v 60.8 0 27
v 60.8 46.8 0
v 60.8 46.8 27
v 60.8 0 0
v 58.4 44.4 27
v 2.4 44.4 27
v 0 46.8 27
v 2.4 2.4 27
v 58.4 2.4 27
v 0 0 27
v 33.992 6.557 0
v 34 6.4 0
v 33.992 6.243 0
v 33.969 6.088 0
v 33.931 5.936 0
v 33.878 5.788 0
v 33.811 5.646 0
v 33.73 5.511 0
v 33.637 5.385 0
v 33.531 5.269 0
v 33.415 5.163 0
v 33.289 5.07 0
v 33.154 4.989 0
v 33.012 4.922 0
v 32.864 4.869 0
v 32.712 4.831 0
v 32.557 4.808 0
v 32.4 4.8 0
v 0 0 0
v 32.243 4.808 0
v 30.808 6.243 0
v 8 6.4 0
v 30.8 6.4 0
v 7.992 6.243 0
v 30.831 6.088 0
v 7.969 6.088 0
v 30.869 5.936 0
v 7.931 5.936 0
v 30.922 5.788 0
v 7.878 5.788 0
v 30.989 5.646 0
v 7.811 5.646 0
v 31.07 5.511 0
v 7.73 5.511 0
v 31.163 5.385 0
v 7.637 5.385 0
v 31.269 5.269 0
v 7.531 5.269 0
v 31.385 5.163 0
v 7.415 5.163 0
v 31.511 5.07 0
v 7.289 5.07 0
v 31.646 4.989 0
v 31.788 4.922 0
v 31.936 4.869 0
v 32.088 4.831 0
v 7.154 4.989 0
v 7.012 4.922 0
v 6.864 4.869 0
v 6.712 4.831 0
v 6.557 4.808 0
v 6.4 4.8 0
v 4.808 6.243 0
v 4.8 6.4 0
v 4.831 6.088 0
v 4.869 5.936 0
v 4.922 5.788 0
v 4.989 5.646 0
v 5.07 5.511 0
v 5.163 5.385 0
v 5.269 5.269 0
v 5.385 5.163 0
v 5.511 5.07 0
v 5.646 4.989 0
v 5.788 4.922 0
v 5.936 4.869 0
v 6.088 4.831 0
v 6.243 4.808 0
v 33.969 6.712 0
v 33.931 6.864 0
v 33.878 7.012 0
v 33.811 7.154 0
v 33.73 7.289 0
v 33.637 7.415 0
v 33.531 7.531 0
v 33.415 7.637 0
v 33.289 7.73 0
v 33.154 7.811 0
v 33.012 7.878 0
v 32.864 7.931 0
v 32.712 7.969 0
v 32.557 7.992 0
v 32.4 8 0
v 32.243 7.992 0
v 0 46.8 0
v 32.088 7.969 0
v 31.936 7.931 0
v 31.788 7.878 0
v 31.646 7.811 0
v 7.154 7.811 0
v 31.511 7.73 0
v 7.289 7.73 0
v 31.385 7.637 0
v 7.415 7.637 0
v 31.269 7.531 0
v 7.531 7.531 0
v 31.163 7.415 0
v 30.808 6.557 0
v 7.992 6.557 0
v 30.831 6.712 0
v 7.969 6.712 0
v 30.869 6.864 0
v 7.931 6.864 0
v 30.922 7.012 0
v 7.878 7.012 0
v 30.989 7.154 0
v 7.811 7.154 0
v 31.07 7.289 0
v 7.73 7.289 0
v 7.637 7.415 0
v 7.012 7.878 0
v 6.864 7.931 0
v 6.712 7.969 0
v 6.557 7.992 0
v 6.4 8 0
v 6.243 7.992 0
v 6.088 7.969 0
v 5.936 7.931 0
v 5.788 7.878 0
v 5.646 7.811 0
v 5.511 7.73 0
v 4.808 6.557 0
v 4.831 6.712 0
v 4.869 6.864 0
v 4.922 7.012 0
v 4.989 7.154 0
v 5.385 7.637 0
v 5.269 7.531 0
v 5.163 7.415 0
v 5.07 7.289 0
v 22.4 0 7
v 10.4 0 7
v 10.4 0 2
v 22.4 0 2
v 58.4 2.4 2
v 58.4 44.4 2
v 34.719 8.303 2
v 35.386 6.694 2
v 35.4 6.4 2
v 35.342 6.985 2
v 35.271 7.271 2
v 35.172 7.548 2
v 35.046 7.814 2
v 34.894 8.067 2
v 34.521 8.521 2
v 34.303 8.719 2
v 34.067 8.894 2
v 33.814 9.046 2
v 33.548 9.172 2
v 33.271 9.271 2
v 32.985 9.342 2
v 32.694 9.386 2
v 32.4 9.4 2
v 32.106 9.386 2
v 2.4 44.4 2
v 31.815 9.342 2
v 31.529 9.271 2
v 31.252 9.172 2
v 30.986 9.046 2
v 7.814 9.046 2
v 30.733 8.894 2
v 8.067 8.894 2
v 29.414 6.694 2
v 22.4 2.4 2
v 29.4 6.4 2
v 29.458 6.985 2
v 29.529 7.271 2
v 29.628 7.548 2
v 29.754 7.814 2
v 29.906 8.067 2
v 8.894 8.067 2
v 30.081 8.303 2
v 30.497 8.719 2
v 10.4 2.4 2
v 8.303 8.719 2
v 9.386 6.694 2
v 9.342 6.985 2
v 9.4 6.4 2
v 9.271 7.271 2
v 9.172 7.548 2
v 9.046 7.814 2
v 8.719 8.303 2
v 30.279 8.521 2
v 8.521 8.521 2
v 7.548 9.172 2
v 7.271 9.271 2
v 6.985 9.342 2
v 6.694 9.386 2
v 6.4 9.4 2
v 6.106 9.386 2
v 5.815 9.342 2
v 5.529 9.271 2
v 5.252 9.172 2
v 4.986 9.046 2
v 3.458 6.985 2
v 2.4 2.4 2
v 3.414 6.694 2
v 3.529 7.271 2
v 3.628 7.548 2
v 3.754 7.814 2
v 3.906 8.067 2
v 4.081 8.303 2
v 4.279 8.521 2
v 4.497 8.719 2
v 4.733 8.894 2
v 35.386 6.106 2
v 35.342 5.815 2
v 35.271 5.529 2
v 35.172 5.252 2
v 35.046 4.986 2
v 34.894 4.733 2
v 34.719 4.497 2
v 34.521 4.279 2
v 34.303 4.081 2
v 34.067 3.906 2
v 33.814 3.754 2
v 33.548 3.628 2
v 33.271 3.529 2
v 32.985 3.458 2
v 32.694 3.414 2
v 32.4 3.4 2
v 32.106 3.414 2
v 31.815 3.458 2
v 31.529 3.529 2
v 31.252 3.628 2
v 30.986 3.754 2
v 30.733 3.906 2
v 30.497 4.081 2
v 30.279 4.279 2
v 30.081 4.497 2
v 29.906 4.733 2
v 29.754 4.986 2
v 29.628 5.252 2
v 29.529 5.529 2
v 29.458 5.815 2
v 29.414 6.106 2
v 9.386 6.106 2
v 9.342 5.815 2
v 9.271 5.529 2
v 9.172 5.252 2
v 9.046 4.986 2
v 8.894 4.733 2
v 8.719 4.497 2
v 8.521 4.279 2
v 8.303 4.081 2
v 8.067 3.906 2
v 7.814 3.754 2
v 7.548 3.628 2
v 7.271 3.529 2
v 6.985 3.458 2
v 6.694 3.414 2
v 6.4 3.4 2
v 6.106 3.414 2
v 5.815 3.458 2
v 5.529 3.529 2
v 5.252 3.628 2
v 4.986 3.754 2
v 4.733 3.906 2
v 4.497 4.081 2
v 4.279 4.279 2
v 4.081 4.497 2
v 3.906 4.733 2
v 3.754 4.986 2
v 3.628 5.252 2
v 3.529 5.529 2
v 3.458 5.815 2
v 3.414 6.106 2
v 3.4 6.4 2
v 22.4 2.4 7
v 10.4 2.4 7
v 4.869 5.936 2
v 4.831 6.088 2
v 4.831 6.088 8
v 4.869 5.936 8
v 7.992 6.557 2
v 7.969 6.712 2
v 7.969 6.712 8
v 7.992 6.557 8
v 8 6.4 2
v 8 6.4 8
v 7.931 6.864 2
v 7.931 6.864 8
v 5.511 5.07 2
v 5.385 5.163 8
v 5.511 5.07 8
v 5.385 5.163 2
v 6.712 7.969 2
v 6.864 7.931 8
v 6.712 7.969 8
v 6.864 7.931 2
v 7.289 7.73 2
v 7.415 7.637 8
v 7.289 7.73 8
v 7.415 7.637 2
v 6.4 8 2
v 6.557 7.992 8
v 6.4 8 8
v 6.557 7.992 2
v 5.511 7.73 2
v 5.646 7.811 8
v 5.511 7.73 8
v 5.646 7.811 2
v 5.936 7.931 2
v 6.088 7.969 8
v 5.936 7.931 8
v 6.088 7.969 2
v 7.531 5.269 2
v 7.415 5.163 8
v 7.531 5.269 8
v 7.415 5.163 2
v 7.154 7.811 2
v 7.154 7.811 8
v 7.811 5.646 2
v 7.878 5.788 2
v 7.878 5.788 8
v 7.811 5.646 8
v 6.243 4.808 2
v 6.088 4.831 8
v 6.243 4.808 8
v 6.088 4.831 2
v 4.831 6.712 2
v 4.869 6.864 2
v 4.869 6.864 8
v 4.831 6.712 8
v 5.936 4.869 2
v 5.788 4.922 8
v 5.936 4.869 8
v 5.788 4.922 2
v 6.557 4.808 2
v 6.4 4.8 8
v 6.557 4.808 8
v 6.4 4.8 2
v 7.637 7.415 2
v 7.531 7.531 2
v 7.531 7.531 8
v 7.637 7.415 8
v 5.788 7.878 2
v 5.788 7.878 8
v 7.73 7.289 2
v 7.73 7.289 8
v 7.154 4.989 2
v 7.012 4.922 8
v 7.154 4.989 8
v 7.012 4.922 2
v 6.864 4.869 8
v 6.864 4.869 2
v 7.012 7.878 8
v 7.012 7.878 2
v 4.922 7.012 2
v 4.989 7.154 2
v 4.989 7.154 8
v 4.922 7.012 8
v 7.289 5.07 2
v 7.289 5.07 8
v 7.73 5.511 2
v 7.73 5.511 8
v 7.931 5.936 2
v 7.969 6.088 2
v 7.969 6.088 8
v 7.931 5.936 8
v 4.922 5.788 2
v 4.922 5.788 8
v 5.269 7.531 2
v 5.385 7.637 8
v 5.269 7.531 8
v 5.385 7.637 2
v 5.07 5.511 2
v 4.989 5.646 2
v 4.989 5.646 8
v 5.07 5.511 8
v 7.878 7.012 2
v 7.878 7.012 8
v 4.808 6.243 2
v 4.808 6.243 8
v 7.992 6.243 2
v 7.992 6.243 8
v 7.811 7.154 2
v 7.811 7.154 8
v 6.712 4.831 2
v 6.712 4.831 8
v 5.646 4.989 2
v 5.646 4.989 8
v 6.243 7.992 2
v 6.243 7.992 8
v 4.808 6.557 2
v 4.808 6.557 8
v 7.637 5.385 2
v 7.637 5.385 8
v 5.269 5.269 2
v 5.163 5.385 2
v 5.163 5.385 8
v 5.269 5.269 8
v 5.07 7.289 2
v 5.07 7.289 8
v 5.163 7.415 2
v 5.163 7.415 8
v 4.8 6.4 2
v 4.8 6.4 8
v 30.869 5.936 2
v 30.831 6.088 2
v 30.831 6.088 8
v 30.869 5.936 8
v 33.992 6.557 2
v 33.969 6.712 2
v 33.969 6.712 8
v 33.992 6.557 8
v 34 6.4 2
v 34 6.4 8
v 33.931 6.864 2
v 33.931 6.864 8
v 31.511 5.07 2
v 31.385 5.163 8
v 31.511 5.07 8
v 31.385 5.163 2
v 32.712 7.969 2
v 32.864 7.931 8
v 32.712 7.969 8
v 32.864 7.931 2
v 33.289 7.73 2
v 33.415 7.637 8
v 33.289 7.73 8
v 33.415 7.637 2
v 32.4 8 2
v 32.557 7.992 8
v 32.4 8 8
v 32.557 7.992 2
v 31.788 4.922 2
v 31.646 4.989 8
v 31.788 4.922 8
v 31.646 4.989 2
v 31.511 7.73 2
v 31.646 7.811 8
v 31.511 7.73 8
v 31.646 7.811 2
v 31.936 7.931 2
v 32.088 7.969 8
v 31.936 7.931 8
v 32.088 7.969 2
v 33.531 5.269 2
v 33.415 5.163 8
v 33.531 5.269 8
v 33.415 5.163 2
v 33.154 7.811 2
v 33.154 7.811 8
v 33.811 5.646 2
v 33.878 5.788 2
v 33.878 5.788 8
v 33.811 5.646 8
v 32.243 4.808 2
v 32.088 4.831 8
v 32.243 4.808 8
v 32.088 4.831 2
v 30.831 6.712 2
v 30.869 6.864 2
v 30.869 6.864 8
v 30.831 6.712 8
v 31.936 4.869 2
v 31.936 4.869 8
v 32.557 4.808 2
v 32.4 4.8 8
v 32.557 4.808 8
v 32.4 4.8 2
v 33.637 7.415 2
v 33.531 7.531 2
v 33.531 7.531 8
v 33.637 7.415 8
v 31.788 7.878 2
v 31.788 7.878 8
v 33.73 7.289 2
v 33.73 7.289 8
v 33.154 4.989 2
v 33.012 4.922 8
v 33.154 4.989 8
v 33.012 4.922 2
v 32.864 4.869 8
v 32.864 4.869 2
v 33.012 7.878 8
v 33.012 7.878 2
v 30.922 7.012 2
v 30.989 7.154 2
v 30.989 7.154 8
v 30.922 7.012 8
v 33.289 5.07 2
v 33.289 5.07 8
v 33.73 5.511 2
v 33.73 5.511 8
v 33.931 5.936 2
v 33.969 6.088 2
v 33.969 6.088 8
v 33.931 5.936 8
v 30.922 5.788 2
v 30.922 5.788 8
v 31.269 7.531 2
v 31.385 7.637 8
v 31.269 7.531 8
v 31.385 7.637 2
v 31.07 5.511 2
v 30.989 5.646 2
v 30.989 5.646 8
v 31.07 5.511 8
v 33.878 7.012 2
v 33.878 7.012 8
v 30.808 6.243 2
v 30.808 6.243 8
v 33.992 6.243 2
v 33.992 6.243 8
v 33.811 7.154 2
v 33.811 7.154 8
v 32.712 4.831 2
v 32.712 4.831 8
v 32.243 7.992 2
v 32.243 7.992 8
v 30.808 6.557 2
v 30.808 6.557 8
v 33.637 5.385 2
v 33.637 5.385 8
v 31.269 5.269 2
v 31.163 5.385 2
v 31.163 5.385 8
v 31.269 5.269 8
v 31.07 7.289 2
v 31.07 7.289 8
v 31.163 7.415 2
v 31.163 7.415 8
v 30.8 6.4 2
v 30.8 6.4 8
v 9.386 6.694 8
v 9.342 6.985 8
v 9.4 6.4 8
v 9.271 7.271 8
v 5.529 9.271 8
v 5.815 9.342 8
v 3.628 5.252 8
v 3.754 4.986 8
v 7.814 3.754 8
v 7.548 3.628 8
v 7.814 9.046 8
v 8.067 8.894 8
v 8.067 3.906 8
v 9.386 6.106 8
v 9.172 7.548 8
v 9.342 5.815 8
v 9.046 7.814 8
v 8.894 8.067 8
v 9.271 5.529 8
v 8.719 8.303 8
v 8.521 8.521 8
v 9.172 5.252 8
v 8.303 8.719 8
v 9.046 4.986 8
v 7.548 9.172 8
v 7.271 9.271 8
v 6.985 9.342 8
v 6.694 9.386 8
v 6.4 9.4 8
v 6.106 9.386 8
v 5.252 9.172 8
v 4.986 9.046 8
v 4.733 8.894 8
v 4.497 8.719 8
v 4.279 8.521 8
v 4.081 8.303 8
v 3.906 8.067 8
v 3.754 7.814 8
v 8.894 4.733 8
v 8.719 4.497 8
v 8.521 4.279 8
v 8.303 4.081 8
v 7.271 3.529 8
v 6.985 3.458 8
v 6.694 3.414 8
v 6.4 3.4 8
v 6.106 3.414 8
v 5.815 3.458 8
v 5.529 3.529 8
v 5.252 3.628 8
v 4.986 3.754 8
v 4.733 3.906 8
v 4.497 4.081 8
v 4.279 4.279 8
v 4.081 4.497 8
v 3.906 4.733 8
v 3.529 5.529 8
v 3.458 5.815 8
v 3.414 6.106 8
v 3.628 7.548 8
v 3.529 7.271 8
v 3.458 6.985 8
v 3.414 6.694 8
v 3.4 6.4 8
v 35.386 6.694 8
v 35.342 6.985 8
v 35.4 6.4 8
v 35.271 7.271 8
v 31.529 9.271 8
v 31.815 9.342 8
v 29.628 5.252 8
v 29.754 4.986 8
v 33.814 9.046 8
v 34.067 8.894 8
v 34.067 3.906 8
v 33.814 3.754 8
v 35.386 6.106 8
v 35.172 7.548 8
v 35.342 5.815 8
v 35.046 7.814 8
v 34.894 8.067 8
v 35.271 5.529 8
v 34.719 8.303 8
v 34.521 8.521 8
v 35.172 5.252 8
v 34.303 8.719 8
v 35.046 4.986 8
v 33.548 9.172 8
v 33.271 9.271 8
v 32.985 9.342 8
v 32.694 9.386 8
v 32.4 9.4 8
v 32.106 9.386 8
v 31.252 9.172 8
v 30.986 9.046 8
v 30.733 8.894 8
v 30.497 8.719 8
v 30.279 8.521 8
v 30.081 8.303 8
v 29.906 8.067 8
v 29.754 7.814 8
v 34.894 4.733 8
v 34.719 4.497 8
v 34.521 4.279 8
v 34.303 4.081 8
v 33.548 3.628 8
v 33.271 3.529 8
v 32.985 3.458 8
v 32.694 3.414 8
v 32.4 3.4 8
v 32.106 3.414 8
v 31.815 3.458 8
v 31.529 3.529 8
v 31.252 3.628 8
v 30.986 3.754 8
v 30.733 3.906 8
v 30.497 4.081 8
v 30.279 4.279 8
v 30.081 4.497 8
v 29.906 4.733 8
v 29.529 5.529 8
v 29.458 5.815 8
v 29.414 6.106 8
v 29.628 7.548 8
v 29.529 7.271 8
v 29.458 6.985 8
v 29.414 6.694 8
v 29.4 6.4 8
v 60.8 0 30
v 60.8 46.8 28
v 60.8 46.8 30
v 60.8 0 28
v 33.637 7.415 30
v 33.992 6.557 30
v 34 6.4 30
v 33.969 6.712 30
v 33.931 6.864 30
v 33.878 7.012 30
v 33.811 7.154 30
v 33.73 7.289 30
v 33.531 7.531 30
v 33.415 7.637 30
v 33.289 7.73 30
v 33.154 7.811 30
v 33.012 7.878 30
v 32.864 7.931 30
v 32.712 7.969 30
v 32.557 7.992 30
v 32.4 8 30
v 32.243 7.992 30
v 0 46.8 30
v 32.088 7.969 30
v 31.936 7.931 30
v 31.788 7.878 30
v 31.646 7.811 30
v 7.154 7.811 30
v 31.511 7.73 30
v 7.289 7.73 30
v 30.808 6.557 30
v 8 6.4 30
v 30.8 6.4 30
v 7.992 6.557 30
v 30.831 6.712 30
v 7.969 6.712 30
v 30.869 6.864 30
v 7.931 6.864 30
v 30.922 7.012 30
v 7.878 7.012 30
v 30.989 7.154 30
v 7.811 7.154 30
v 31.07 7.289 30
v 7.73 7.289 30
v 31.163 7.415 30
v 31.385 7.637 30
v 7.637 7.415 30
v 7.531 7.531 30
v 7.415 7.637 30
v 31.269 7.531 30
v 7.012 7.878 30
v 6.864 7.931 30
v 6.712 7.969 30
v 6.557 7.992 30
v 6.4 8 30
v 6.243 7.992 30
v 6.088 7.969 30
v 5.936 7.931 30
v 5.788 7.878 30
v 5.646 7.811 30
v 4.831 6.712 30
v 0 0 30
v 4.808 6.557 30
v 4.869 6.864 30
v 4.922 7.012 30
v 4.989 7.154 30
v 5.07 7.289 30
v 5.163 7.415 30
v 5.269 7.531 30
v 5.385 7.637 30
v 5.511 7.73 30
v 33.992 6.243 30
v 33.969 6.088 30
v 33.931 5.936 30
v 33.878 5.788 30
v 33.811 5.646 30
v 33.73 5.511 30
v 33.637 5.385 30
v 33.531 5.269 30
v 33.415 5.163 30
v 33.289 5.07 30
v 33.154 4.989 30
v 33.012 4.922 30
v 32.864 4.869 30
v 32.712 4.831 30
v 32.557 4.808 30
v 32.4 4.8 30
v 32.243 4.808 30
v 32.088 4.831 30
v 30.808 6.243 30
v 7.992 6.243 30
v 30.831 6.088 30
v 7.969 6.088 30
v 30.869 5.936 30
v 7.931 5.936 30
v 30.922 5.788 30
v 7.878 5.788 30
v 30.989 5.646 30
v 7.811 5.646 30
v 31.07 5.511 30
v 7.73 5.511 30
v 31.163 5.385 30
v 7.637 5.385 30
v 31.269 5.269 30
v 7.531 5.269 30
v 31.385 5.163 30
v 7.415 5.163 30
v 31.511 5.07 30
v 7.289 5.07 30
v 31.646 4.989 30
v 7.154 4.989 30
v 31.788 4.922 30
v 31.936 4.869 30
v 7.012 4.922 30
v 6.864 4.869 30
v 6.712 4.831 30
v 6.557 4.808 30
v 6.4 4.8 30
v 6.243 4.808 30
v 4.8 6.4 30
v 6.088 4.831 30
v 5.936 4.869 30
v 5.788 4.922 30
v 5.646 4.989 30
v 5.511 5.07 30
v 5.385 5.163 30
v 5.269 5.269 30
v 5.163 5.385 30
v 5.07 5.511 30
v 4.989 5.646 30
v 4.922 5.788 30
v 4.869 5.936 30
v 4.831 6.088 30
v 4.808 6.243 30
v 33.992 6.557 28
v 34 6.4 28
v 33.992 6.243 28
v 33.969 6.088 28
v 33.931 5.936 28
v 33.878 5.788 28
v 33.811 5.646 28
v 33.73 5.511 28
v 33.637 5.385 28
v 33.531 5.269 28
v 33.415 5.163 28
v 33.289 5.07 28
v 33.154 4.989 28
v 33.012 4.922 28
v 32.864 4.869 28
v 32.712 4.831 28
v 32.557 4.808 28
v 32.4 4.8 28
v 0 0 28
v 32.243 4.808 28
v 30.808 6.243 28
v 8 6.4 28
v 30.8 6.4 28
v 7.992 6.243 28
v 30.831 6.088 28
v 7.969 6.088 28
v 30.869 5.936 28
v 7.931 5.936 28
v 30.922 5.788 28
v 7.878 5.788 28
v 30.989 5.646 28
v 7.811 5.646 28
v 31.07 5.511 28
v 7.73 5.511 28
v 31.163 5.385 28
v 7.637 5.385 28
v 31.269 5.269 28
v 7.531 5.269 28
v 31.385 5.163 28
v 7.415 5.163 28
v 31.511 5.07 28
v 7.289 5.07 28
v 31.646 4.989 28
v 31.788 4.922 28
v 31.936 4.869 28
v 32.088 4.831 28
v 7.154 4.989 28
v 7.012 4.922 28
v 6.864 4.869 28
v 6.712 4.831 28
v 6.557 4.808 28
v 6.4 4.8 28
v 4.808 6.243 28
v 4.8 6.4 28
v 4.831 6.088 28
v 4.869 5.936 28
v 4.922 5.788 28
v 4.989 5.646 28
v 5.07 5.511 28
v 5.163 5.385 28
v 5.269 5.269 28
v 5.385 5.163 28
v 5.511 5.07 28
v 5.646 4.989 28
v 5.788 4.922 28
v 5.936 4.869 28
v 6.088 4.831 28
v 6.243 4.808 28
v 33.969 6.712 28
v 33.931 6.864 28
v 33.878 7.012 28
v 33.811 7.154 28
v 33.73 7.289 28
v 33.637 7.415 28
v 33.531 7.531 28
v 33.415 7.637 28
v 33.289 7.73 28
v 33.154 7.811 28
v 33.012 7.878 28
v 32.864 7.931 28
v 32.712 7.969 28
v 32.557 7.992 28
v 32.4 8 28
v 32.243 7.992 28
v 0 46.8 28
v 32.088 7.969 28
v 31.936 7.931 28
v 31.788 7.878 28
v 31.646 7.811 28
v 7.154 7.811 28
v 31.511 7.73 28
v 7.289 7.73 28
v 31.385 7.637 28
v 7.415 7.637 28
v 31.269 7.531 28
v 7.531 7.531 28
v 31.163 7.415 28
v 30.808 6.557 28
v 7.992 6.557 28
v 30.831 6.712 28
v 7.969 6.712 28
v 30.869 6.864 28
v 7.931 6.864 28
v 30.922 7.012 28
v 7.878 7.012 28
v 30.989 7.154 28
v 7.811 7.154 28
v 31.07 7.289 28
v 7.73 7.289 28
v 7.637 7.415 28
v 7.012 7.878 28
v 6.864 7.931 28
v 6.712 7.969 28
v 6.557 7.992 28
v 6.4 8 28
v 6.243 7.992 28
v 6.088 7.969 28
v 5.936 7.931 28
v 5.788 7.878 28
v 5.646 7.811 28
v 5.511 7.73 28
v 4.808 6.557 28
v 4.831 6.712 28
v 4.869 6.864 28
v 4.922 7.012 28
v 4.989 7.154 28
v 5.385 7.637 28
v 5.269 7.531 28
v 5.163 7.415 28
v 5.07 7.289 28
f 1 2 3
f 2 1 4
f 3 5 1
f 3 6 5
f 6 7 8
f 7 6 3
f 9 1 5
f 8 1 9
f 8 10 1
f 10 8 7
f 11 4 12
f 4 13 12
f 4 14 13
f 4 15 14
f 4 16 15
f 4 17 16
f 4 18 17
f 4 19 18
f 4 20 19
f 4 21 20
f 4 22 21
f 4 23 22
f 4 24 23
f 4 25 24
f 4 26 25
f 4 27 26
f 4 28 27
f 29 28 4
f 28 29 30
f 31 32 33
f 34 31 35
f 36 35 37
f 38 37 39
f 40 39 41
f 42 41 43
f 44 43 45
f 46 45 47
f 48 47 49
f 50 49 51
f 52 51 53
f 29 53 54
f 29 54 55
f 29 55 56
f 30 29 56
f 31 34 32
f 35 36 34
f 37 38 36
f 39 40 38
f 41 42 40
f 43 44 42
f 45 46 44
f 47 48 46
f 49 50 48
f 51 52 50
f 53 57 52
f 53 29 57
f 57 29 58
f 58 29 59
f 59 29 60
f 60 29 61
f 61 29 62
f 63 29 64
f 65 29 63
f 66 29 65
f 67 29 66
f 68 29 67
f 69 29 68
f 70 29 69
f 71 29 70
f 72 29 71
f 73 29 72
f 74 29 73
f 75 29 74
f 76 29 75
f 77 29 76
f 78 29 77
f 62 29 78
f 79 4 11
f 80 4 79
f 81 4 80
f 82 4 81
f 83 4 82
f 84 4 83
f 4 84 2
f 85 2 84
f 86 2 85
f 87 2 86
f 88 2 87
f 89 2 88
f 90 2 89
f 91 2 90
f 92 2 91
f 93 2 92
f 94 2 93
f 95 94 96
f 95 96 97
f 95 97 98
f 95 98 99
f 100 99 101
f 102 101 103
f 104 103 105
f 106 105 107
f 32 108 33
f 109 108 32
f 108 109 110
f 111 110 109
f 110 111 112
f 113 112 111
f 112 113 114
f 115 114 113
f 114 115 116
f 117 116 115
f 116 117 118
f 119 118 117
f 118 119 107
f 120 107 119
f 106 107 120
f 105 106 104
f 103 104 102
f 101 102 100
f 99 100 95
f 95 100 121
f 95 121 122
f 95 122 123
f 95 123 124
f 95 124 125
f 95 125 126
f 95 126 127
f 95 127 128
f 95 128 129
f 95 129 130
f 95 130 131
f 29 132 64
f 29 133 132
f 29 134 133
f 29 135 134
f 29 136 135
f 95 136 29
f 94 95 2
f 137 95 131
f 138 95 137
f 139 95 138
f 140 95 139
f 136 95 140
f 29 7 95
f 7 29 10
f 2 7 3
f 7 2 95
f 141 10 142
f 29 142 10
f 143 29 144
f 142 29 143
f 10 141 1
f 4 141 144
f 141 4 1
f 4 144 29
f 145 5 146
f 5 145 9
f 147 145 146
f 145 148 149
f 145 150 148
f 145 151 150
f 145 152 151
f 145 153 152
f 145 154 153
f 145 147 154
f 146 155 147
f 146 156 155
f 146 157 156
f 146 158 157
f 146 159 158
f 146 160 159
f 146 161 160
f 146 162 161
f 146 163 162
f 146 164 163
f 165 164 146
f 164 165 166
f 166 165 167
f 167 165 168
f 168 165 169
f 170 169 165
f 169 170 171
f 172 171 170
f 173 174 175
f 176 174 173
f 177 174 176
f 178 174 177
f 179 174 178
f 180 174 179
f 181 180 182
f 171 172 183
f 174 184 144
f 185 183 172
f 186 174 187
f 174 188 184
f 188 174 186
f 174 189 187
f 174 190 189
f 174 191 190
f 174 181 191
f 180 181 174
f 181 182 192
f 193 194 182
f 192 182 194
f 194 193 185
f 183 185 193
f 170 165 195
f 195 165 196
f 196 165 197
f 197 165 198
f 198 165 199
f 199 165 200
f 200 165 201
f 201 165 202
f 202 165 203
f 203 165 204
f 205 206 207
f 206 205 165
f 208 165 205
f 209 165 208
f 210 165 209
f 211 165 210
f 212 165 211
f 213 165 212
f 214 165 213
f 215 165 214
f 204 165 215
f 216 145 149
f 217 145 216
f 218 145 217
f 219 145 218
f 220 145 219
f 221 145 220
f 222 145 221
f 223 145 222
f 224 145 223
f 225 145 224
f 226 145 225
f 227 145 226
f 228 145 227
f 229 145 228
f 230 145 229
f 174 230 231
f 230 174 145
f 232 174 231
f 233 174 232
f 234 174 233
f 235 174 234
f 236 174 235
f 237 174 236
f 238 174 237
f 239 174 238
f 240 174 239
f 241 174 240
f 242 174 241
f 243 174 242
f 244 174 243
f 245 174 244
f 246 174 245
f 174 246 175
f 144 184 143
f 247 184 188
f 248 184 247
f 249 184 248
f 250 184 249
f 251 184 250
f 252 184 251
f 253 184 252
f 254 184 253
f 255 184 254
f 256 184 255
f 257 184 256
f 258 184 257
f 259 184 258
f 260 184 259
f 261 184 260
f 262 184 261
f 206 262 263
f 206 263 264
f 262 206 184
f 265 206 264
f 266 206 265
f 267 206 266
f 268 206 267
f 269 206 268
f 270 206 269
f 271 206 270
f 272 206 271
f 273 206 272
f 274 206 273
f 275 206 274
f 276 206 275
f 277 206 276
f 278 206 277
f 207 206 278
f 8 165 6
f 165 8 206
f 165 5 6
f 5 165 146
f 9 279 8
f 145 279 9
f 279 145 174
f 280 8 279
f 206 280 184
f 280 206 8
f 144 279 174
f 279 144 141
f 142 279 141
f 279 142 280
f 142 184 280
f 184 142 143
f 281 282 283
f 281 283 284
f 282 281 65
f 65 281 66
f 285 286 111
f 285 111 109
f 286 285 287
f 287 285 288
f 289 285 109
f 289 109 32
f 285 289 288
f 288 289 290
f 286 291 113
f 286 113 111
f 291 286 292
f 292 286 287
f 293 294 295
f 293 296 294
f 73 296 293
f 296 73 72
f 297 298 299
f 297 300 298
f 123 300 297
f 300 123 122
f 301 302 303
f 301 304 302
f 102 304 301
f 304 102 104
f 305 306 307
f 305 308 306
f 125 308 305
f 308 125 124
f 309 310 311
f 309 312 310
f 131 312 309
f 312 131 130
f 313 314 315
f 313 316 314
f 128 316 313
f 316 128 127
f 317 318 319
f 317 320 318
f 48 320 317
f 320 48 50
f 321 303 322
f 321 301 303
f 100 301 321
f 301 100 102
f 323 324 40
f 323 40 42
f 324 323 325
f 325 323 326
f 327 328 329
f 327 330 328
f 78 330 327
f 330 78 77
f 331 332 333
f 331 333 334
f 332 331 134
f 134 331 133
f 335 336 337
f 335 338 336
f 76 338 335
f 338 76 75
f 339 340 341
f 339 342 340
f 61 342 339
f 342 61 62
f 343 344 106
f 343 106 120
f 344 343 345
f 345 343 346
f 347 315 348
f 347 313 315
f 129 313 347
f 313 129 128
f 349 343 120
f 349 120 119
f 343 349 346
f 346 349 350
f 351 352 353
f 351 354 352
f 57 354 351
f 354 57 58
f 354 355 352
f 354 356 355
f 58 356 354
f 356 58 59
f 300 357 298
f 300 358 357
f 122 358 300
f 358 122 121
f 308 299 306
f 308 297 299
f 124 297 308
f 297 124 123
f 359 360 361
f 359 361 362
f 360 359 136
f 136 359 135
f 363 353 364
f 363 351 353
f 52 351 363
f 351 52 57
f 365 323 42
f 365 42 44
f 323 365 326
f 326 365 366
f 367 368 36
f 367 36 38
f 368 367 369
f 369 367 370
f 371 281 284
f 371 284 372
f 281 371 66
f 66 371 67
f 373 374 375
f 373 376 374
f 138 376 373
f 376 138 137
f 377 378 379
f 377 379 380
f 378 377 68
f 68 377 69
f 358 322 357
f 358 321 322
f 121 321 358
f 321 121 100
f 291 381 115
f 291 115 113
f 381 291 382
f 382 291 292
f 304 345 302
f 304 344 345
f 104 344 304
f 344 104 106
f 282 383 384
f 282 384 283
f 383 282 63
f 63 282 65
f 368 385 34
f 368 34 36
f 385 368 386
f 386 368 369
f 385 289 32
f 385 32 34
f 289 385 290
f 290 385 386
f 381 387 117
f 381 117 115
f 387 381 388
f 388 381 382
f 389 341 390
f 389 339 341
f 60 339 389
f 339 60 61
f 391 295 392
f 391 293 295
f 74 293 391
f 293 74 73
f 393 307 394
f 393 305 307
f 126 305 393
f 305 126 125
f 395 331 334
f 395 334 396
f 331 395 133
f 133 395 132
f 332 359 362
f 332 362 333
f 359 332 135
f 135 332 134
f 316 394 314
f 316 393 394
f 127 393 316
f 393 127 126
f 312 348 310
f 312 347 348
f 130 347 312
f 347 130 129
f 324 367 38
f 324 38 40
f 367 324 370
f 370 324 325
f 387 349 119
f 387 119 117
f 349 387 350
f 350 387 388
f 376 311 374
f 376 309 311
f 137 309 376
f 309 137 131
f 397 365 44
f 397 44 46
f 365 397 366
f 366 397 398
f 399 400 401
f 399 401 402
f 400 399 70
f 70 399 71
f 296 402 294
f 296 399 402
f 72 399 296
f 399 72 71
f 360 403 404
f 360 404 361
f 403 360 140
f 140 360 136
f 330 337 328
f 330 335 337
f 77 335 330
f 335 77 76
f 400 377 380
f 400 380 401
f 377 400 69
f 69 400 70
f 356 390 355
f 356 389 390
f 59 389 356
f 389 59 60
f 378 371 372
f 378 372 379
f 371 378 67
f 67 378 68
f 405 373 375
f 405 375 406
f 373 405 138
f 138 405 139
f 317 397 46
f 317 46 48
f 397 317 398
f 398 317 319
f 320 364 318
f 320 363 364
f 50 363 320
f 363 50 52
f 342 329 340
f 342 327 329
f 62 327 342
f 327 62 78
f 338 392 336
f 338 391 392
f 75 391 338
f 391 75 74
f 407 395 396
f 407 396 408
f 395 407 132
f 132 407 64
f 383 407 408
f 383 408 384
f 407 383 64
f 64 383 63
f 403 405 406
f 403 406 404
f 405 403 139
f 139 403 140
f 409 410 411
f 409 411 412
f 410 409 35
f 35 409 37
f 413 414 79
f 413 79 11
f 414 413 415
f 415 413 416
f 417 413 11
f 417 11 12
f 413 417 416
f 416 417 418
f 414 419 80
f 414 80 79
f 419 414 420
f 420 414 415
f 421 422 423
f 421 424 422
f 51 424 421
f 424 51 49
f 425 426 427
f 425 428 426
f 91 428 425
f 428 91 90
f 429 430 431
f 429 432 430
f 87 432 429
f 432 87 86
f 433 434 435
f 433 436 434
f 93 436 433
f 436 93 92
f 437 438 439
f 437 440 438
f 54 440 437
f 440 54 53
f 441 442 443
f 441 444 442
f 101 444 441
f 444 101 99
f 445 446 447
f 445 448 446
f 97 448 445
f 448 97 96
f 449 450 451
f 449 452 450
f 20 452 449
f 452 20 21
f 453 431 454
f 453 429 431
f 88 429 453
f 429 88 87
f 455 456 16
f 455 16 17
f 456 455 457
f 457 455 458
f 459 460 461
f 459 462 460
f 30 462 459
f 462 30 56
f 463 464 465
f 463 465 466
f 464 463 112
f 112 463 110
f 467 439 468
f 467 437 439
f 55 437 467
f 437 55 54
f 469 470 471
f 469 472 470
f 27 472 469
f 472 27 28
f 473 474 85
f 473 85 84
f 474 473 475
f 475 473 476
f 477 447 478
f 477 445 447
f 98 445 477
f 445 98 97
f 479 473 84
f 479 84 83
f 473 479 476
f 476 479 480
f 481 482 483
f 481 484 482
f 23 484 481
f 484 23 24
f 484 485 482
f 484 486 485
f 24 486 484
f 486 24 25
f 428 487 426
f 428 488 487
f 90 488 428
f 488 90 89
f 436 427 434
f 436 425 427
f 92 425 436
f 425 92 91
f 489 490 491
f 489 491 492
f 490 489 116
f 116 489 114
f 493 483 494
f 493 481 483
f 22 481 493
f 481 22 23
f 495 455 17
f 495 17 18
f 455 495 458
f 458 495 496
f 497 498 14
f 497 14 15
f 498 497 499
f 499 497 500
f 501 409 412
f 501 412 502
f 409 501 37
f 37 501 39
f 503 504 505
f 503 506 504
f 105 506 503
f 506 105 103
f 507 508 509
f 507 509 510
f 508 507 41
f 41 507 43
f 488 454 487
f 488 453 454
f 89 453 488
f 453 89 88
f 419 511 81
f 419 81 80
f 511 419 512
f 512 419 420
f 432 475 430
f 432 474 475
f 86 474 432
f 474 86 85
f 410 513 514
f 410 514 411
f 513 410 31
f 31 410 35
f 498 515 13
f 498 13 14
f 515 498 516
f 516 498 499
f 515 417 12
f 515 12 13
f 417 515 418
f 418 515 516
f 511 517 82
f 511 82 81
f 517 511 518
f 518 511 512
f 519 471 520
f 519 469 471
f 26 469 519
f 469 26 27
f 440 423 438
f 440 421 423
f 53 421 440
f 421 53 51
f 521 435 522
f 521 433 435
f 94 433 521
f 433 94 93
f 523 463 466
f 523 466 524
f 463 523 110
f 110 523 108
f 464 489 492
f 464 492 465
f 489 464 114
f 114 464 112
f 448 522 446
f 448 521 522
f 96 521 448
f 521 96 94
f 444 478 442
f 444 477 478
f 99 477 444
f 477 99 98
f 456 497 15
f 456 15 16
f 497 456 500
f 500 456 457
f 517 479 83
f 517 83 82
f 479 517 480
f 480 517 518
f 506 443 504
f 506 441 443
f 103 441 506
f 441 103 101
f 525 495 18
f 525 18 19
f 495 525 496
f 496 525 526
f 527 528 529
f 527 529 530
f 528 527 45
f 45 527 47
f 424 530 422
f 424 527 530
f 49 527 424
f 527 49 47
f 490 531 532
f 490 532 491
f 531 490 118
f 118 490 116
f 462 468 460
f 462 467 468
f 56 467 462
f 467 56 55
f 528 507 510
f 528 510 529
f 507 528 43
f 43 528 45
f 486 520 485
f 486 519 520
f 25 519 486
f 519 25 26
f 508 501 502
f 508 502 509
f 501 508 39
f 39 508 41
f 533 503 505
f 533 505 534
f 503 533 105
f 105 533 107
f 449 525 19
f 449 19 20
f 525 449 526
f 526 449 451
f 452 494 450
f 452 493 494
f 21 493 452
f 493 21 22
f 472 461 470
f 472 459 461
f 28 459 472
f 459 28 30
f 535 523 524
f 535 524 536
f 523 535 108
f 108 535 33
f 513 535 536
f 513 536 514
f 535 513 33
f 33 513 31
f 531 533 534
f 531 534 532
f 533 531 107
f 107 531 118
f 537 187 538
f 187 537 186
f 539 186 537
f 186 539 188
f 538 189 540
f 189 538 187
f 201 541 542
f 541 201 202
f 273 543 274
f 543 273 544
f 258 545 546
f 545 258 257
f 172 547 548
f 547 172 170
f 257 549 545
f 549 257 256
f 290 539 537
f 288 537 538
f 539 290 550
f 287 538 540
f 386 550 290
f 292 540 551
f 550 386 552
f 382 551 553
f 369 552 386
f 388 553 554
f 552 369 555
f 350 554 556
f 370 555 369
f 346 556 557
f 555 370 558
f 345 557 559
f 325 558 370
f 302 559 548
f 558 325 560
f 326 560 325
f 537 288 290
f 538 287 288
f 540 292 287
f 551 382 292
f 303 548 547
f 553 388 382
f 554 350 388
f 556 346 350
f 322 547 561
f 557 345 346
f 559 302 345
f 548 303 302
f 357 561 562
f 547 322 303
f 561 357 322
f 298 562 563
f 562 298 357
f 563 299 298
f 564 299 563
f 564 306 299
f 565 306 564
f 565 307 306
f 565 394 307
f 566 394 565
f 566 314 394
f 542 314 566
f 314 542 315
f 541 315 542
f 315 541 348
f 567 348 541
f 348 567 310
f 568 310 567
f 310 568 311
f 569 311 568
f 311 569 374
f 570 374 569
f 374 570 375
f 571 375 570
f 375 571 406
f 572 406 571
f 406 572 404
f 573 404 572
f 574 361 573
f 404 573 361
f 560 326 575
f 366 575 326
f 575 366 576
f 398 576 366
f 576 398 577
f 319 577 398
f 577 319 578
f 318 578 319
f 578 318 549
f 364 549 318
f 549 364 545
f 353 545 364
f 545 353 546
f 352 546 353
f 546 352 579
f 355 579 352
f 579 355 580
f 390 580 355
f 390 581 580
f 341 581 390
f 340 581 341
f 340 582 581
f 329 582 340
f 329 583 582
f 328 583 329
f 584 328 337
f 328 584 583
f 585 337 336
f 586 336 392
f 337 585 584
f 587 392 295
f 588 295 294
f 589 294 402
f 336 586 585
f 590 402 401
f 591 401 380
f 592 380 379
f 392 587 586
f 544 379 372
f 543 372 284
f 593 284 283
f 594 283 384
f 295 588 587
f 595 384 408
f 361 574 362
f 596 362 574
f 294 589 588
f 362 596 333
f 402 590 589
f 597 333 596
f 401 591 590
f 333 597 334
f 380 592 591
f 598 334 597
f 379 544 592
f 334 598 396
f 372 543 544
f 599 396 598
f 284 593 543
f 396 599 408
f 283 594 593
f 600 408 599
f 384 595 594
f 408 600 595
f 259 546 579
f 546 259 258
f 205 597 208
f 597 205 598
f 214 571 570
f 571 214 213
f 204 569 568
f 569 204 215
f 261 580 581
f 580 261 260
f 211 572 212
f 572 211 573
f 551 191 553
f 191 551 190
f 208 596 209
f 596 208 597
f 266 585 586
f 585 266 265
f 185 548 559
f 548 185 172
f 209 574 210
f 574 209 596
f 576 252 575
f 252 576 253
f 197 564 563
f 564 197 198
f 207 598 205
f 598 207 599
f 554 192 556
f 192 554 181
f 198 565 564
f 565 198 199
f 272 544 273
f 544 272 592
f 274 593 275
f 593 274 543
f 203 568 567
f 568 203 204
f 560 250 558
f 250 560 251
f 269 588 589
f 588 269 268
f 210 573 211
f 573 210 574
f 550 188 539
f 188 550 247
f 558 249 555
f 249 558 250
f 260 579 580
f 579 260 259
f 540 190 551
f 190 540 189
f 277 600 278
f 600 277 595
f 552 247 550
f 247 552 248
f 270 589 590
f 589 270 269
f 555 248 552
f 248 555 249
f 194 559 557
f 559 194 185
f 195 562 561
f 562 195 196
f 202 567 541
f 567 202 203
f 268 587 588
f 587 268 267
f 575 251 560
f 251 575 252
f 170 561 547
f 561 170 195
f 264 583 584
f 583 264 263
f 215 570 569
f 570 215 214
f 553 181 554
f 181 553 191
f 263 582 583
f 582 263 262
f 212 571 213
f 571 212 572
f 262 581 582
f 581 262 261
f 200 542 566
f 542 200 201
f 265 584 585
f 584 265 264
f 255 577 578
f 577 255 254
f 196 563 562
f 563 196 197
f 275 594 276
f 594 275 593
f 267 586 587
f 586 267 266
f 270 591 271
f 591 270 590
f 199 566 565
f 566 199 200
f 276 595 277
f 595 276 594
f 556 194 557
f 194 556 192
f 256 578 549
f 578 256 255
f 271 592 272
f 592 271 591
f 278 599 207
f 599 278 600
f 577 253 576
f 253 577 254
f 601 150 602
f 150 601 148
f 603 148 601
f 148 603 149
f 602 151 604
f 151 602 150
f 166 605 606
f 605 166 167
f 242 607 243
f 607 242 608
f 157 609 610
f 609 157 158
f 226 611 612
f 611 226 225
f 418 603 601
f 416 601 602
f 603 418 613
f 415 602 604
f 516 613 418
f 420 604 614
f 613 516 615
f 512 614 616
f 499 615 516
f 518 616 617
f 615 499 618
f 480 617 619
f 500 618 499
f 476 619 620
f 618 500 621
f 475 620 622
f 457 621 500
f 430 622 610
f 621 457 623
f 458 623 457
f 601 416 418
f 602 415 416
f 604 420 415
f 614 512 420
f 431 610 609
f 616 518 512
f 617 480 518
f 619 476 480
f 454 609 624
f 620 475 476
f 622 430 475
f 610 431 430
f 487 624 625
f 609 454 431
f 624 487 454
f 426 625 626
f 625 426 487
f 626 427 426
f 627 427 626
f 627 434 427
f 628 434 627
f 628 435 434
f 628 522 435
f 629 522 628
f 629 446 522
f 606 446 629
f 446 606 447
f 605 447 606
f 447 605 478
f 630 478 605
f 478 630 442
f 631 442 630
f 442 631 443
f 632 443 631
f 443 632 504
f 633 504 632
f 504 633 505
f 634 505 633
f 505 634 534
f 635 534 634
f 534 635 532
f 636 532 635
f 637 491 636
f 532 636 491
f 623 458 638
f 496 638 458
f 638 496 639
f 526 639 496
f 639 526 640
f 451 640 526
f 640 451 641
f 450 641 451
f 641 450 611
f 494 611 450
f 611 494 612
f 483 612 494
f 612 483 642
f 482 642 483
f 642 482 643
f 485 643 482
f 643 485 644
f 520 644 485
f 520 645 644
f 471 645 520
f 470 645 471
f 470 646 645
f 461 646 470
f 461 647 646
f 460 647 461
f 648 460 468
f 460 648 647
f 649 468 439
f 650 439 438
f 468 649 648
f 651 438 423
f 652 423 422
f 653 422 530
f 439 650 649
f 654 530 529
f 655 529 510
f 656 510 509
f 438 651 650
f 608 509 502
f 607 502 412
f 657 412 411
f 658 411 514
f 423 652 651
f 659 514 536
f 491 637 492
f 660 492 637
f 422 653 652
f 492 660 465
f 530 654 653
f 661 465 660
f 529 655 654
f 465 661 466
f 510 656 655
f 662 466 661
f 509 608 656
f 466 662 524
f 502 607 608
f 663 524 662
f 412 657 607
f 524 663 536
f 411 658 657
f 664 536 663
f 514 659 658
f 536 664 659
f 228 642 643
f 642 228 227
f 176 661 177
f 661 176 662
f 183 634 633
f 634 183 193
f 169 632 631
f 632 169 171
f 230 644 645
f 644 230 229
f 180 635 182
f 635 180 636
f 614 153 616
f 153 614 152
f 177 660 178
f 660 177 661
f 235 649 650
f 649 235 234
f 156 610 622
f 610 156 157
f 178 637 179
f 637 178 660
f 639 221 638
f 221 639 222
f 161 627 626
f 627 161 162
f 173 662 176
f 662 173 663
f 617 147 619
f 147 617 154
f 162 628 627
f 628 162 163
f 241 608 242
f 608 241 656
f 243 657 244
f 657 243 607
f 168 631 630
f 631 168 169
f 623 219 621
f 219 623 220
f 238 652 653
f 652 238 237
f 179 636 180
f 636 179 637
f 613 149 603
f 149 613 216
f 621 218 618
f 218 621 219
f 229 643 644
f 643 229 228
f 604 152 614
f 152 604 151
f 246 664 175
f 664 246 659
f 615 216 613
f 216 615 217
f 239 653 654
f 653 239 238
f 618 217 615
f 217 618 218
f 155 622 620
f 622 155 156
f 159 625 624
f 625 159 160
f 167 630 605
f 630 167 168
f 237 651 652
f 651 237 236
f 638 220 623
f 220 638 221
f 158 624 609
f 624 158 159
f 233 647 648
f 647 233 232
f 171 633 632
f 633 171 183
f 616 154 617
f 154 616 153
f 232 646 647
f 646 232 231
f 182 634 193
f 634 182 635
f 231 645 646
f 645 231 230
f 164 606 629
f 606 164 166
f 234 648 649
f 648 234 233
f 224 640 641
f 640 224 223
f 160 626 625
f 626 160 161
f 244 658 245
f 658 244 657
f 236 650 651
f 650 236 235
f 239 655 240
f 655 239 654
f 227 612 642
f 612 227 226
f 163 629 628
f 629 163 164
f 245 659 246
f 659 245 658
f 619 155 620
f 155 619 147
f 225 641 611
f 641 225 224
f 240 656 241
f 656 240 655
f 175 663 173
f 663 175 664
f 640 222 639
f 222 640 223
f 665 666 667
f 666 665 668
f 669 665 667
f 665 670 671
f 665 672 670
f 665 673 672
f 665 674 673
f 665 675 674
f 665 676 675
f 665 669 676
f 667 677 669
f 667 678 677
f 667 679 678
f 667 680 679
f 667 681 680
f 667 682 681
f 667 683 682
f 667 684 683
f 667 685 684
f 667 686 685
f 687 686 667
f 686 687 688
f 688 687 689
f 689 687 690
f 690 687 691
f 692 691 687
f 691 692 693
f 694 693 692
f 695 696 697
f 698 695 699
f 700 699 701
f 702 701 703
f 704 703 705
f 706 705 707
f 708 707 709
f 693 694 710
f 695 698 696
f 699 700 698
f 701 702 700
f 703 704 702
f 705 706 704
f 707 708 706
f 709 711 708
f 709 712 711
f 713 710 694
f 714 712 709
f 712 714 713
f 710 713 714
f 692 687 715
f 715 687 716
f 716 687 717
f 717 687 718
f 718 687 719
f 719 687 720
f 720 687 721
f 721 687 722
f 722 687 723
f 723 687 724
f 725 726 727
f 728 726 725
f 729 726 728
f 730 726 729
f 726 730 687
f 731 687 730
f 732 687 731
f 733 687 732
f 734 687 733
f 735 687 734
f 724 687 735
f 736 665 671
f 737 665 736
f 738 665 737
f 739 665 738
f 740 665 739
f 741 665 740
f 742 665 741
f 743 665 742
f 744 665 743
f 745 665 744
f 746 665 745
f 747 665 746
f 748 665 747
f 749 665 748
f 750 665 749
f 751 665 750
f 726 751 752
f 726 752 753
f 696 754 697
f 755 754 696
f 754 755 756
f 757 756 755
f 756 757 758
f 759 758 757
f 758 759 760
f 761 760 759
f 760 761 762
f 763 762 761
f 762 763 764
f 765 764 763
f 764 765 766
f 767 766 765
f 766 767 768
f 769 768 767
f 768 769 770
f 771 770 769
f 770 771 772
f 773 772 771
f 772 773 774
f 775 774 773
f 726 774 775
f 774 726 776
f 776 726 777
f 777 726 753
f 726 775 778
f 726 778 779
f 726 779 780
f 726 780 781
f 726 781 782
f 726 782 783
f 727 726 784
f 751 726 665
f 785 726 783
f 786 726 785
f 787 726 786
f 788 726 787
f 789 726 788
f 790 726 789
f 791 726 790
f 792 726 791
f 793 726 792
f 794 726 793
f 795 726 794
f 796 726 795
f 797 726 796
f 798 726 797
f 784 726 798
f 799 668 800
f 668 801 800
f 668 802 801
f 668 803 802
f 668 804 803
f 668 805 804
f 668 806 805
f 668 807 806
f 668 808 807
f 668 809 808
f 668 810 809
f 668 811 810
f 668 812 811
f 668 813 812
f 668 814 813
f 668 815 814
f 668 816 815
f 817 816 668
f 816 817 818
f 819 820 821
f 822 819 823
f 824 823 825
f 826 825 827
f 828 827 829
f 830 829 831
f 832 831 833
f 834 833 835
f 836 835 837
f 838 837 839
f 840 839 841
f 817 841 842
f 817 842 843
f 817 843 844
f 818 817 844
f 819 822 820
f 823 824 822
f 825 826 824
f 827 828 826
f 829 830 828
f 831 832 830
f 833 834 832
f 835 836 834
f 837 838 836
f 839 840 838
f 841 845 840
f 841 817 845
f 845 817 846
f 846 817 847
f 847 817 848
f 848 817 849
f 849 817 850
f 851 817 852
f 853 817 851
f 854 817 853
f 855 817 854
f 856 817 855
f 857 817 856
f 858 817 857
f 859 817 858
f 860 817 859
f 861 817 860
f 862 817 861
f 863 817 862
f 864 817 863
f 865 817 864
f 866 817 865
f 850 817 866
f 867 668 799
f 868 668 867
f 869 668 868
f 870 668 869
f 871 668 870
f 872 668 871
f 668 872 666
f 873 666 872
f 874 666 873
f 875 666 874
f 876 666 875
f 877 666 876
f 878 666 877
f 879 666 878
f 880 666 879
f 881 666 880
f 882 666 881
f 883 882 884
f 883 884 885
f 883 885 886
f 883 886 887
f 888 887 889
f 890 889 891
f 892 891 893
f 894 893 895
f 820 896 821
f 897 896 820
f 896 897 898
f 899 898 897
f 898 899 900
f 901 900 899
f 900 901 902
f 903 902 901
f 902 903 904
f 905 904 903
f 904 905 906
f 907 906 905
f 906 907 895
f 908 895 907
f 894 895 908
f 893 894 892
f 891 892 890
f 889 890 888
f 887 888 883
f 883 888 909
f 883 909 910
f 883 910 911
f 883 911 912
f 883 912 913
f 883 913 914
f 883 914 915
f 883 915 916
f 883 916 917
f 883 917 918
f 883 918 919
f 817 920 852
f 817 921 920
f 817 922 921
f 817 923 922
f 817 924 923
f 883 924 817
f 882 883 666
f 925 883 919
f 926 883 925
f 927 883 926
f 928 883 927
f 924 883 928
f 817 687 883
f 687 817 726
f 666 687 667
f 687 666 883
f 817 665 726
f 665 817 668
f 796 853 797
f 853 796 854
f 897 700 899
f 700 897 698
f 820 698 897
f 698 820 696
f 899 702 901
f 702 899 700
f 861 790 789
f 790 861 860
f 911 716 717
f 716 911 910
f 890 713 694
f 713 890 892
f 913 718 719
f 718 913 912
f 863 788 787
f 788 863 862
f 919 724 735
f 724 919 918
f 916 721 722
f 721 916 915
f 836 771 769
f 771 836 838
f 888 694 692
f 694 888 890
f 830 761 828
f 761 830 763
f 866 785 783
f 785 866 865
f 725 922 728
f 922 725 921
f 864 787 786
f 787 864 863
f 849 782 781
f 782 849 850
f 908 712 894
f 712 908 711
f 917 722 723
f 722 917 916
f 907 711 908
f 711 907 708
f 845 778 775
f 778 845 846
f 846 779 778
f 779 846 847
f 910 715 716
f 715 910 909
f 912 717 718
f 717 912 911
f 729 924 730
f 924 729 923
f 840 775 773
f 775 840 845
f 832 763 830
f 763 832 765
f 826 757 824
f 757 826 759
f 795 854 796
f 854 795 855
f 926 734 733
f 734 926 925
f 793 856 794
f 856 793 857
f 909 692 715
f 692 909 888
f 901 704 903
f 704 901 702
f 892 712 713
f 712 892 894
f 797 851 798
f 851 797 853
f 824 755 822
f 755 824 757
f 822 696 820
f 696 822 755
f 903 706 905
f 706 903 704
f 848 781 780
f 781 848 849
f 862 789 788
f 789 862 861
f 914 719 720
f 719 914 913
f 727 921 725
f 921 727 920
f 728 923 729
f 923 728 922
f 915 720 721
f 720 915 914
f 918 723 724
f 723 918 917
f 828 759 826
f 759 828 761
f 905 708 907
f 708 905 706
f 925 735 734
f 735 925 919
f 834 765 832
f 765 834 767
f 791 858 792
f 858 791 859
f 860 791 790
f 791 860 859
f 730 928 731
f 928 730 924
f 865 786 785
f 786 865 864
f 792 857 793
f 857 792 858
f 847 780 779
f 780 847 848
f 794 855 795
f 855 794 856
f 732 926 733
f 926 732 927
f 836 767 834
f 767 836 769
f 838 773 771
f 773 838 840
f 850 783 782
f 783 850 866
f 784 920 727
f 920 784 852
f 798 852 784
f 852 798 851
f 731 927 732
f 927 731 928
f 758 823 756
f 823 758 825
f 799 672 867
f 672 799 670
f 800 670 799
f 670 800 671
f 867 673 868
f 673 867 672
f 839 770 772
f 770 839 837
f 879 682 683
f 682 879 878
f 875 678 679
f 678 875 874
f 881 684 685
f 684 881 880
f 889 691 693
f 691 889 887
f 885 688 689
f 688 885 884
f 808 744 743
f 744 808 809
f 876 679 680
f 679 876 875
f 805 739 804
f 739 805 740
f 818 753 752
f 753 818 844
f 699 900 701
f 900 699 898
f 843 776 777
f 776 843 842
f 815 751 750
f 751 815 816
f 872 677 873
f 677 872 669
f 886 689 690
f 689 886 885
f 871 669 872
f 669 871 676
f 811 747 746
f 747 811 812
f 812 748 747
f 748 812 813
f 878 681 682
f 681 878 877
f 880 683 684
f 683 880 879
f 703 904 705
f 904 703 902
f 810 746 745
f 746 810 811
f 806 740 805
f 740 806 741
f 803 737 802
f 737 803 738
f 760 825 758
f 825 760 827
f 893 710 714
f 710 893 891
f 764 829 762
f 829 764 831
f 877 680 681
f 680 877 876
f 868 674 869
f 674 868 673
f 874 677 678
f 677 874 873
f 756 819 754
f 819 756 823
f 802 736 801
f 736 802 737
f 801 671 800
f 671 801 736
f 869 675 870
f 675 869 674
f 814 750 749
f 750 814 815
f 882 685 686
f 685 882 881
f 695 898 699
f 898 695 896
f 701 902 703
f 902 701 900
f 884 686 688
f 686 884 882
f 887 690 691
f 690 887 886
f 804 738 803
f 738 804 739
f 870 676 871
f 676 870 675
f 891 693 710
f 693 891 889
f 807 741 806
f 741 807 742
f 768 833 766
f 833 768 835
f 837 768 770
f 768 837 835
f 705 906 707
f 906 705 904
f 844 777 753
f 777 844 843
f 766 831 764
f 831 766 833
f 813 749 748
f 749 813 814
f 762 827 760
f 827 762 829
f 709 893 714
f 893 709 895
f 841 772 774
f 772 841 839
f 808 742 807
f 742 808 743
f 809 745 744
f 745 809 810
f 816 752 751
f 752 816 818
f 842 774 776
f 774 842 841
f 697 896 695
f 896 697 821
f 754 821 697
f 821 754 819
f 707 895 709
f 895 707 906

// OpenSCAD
// Auto-generated by Mecha-Splicer
// enclosure=ctrl_box_1_enclosure

$fn = 64;

inner_w = 56.0;
inner_d = 42.0;
inner_h = 25.0;
wall = 2.4;
floor = 2.0;
lid_t = 2.0;
standoff_h = 6.0;
standoff_od = 6.0;
standoff_hole_d = 3.2;

module base() {
  union() {
    difference() {
      cube([60.8, 46.8, 27.0], center=false);
      translate([2.4, 2.4, 2.0]) cube([56.0, 42.0, 25.0], center=false);
    translate([10.4, 0, 2.0]) cube([12.0, 3.4, 5.0], center=false);
      translate([6.4, 6.4, -1]) cylinder(h=29.0, d=3.2, center=false);
      translate([32.4, 6.4, -1]) cylinder(h=29.0, d=3.2, center=false);
    }
    // Standoffs
    difference() {
      union() {
        translate([6.4, 6.4, 2.0]) cylinder(h=standoff_h, d=standoff_od, center=false);
        translate([32.4, 6.4, 2.0]) cylinder(h=standoff_h, d=standoff_od, center=false);
      }
      translate([6.4, 6.4, 1.0]) cylinder(h=standoff_h + 2, d=standoff_hole_d, center=false);
      translate([32.4, 6.4, 1.0]) cylinder(h=standoff_h + 2, d=standoff_hole_d, center=false);
    }
  }
}

module lid() {
  difference() {
    cube([60.8, 46.8, 2.0], center=false);
    translate([6.4, 6.4, -1]) cylinder(h=4.0, d=3.2, center=false);
    translate([32.4, 6.4, -1]) cylinder(h=4.0, d=3.2, center=false);
  }
}

module enclosure() {
  base();
  translate([0, 0, 28.0]) lid();
}
enclosure();
